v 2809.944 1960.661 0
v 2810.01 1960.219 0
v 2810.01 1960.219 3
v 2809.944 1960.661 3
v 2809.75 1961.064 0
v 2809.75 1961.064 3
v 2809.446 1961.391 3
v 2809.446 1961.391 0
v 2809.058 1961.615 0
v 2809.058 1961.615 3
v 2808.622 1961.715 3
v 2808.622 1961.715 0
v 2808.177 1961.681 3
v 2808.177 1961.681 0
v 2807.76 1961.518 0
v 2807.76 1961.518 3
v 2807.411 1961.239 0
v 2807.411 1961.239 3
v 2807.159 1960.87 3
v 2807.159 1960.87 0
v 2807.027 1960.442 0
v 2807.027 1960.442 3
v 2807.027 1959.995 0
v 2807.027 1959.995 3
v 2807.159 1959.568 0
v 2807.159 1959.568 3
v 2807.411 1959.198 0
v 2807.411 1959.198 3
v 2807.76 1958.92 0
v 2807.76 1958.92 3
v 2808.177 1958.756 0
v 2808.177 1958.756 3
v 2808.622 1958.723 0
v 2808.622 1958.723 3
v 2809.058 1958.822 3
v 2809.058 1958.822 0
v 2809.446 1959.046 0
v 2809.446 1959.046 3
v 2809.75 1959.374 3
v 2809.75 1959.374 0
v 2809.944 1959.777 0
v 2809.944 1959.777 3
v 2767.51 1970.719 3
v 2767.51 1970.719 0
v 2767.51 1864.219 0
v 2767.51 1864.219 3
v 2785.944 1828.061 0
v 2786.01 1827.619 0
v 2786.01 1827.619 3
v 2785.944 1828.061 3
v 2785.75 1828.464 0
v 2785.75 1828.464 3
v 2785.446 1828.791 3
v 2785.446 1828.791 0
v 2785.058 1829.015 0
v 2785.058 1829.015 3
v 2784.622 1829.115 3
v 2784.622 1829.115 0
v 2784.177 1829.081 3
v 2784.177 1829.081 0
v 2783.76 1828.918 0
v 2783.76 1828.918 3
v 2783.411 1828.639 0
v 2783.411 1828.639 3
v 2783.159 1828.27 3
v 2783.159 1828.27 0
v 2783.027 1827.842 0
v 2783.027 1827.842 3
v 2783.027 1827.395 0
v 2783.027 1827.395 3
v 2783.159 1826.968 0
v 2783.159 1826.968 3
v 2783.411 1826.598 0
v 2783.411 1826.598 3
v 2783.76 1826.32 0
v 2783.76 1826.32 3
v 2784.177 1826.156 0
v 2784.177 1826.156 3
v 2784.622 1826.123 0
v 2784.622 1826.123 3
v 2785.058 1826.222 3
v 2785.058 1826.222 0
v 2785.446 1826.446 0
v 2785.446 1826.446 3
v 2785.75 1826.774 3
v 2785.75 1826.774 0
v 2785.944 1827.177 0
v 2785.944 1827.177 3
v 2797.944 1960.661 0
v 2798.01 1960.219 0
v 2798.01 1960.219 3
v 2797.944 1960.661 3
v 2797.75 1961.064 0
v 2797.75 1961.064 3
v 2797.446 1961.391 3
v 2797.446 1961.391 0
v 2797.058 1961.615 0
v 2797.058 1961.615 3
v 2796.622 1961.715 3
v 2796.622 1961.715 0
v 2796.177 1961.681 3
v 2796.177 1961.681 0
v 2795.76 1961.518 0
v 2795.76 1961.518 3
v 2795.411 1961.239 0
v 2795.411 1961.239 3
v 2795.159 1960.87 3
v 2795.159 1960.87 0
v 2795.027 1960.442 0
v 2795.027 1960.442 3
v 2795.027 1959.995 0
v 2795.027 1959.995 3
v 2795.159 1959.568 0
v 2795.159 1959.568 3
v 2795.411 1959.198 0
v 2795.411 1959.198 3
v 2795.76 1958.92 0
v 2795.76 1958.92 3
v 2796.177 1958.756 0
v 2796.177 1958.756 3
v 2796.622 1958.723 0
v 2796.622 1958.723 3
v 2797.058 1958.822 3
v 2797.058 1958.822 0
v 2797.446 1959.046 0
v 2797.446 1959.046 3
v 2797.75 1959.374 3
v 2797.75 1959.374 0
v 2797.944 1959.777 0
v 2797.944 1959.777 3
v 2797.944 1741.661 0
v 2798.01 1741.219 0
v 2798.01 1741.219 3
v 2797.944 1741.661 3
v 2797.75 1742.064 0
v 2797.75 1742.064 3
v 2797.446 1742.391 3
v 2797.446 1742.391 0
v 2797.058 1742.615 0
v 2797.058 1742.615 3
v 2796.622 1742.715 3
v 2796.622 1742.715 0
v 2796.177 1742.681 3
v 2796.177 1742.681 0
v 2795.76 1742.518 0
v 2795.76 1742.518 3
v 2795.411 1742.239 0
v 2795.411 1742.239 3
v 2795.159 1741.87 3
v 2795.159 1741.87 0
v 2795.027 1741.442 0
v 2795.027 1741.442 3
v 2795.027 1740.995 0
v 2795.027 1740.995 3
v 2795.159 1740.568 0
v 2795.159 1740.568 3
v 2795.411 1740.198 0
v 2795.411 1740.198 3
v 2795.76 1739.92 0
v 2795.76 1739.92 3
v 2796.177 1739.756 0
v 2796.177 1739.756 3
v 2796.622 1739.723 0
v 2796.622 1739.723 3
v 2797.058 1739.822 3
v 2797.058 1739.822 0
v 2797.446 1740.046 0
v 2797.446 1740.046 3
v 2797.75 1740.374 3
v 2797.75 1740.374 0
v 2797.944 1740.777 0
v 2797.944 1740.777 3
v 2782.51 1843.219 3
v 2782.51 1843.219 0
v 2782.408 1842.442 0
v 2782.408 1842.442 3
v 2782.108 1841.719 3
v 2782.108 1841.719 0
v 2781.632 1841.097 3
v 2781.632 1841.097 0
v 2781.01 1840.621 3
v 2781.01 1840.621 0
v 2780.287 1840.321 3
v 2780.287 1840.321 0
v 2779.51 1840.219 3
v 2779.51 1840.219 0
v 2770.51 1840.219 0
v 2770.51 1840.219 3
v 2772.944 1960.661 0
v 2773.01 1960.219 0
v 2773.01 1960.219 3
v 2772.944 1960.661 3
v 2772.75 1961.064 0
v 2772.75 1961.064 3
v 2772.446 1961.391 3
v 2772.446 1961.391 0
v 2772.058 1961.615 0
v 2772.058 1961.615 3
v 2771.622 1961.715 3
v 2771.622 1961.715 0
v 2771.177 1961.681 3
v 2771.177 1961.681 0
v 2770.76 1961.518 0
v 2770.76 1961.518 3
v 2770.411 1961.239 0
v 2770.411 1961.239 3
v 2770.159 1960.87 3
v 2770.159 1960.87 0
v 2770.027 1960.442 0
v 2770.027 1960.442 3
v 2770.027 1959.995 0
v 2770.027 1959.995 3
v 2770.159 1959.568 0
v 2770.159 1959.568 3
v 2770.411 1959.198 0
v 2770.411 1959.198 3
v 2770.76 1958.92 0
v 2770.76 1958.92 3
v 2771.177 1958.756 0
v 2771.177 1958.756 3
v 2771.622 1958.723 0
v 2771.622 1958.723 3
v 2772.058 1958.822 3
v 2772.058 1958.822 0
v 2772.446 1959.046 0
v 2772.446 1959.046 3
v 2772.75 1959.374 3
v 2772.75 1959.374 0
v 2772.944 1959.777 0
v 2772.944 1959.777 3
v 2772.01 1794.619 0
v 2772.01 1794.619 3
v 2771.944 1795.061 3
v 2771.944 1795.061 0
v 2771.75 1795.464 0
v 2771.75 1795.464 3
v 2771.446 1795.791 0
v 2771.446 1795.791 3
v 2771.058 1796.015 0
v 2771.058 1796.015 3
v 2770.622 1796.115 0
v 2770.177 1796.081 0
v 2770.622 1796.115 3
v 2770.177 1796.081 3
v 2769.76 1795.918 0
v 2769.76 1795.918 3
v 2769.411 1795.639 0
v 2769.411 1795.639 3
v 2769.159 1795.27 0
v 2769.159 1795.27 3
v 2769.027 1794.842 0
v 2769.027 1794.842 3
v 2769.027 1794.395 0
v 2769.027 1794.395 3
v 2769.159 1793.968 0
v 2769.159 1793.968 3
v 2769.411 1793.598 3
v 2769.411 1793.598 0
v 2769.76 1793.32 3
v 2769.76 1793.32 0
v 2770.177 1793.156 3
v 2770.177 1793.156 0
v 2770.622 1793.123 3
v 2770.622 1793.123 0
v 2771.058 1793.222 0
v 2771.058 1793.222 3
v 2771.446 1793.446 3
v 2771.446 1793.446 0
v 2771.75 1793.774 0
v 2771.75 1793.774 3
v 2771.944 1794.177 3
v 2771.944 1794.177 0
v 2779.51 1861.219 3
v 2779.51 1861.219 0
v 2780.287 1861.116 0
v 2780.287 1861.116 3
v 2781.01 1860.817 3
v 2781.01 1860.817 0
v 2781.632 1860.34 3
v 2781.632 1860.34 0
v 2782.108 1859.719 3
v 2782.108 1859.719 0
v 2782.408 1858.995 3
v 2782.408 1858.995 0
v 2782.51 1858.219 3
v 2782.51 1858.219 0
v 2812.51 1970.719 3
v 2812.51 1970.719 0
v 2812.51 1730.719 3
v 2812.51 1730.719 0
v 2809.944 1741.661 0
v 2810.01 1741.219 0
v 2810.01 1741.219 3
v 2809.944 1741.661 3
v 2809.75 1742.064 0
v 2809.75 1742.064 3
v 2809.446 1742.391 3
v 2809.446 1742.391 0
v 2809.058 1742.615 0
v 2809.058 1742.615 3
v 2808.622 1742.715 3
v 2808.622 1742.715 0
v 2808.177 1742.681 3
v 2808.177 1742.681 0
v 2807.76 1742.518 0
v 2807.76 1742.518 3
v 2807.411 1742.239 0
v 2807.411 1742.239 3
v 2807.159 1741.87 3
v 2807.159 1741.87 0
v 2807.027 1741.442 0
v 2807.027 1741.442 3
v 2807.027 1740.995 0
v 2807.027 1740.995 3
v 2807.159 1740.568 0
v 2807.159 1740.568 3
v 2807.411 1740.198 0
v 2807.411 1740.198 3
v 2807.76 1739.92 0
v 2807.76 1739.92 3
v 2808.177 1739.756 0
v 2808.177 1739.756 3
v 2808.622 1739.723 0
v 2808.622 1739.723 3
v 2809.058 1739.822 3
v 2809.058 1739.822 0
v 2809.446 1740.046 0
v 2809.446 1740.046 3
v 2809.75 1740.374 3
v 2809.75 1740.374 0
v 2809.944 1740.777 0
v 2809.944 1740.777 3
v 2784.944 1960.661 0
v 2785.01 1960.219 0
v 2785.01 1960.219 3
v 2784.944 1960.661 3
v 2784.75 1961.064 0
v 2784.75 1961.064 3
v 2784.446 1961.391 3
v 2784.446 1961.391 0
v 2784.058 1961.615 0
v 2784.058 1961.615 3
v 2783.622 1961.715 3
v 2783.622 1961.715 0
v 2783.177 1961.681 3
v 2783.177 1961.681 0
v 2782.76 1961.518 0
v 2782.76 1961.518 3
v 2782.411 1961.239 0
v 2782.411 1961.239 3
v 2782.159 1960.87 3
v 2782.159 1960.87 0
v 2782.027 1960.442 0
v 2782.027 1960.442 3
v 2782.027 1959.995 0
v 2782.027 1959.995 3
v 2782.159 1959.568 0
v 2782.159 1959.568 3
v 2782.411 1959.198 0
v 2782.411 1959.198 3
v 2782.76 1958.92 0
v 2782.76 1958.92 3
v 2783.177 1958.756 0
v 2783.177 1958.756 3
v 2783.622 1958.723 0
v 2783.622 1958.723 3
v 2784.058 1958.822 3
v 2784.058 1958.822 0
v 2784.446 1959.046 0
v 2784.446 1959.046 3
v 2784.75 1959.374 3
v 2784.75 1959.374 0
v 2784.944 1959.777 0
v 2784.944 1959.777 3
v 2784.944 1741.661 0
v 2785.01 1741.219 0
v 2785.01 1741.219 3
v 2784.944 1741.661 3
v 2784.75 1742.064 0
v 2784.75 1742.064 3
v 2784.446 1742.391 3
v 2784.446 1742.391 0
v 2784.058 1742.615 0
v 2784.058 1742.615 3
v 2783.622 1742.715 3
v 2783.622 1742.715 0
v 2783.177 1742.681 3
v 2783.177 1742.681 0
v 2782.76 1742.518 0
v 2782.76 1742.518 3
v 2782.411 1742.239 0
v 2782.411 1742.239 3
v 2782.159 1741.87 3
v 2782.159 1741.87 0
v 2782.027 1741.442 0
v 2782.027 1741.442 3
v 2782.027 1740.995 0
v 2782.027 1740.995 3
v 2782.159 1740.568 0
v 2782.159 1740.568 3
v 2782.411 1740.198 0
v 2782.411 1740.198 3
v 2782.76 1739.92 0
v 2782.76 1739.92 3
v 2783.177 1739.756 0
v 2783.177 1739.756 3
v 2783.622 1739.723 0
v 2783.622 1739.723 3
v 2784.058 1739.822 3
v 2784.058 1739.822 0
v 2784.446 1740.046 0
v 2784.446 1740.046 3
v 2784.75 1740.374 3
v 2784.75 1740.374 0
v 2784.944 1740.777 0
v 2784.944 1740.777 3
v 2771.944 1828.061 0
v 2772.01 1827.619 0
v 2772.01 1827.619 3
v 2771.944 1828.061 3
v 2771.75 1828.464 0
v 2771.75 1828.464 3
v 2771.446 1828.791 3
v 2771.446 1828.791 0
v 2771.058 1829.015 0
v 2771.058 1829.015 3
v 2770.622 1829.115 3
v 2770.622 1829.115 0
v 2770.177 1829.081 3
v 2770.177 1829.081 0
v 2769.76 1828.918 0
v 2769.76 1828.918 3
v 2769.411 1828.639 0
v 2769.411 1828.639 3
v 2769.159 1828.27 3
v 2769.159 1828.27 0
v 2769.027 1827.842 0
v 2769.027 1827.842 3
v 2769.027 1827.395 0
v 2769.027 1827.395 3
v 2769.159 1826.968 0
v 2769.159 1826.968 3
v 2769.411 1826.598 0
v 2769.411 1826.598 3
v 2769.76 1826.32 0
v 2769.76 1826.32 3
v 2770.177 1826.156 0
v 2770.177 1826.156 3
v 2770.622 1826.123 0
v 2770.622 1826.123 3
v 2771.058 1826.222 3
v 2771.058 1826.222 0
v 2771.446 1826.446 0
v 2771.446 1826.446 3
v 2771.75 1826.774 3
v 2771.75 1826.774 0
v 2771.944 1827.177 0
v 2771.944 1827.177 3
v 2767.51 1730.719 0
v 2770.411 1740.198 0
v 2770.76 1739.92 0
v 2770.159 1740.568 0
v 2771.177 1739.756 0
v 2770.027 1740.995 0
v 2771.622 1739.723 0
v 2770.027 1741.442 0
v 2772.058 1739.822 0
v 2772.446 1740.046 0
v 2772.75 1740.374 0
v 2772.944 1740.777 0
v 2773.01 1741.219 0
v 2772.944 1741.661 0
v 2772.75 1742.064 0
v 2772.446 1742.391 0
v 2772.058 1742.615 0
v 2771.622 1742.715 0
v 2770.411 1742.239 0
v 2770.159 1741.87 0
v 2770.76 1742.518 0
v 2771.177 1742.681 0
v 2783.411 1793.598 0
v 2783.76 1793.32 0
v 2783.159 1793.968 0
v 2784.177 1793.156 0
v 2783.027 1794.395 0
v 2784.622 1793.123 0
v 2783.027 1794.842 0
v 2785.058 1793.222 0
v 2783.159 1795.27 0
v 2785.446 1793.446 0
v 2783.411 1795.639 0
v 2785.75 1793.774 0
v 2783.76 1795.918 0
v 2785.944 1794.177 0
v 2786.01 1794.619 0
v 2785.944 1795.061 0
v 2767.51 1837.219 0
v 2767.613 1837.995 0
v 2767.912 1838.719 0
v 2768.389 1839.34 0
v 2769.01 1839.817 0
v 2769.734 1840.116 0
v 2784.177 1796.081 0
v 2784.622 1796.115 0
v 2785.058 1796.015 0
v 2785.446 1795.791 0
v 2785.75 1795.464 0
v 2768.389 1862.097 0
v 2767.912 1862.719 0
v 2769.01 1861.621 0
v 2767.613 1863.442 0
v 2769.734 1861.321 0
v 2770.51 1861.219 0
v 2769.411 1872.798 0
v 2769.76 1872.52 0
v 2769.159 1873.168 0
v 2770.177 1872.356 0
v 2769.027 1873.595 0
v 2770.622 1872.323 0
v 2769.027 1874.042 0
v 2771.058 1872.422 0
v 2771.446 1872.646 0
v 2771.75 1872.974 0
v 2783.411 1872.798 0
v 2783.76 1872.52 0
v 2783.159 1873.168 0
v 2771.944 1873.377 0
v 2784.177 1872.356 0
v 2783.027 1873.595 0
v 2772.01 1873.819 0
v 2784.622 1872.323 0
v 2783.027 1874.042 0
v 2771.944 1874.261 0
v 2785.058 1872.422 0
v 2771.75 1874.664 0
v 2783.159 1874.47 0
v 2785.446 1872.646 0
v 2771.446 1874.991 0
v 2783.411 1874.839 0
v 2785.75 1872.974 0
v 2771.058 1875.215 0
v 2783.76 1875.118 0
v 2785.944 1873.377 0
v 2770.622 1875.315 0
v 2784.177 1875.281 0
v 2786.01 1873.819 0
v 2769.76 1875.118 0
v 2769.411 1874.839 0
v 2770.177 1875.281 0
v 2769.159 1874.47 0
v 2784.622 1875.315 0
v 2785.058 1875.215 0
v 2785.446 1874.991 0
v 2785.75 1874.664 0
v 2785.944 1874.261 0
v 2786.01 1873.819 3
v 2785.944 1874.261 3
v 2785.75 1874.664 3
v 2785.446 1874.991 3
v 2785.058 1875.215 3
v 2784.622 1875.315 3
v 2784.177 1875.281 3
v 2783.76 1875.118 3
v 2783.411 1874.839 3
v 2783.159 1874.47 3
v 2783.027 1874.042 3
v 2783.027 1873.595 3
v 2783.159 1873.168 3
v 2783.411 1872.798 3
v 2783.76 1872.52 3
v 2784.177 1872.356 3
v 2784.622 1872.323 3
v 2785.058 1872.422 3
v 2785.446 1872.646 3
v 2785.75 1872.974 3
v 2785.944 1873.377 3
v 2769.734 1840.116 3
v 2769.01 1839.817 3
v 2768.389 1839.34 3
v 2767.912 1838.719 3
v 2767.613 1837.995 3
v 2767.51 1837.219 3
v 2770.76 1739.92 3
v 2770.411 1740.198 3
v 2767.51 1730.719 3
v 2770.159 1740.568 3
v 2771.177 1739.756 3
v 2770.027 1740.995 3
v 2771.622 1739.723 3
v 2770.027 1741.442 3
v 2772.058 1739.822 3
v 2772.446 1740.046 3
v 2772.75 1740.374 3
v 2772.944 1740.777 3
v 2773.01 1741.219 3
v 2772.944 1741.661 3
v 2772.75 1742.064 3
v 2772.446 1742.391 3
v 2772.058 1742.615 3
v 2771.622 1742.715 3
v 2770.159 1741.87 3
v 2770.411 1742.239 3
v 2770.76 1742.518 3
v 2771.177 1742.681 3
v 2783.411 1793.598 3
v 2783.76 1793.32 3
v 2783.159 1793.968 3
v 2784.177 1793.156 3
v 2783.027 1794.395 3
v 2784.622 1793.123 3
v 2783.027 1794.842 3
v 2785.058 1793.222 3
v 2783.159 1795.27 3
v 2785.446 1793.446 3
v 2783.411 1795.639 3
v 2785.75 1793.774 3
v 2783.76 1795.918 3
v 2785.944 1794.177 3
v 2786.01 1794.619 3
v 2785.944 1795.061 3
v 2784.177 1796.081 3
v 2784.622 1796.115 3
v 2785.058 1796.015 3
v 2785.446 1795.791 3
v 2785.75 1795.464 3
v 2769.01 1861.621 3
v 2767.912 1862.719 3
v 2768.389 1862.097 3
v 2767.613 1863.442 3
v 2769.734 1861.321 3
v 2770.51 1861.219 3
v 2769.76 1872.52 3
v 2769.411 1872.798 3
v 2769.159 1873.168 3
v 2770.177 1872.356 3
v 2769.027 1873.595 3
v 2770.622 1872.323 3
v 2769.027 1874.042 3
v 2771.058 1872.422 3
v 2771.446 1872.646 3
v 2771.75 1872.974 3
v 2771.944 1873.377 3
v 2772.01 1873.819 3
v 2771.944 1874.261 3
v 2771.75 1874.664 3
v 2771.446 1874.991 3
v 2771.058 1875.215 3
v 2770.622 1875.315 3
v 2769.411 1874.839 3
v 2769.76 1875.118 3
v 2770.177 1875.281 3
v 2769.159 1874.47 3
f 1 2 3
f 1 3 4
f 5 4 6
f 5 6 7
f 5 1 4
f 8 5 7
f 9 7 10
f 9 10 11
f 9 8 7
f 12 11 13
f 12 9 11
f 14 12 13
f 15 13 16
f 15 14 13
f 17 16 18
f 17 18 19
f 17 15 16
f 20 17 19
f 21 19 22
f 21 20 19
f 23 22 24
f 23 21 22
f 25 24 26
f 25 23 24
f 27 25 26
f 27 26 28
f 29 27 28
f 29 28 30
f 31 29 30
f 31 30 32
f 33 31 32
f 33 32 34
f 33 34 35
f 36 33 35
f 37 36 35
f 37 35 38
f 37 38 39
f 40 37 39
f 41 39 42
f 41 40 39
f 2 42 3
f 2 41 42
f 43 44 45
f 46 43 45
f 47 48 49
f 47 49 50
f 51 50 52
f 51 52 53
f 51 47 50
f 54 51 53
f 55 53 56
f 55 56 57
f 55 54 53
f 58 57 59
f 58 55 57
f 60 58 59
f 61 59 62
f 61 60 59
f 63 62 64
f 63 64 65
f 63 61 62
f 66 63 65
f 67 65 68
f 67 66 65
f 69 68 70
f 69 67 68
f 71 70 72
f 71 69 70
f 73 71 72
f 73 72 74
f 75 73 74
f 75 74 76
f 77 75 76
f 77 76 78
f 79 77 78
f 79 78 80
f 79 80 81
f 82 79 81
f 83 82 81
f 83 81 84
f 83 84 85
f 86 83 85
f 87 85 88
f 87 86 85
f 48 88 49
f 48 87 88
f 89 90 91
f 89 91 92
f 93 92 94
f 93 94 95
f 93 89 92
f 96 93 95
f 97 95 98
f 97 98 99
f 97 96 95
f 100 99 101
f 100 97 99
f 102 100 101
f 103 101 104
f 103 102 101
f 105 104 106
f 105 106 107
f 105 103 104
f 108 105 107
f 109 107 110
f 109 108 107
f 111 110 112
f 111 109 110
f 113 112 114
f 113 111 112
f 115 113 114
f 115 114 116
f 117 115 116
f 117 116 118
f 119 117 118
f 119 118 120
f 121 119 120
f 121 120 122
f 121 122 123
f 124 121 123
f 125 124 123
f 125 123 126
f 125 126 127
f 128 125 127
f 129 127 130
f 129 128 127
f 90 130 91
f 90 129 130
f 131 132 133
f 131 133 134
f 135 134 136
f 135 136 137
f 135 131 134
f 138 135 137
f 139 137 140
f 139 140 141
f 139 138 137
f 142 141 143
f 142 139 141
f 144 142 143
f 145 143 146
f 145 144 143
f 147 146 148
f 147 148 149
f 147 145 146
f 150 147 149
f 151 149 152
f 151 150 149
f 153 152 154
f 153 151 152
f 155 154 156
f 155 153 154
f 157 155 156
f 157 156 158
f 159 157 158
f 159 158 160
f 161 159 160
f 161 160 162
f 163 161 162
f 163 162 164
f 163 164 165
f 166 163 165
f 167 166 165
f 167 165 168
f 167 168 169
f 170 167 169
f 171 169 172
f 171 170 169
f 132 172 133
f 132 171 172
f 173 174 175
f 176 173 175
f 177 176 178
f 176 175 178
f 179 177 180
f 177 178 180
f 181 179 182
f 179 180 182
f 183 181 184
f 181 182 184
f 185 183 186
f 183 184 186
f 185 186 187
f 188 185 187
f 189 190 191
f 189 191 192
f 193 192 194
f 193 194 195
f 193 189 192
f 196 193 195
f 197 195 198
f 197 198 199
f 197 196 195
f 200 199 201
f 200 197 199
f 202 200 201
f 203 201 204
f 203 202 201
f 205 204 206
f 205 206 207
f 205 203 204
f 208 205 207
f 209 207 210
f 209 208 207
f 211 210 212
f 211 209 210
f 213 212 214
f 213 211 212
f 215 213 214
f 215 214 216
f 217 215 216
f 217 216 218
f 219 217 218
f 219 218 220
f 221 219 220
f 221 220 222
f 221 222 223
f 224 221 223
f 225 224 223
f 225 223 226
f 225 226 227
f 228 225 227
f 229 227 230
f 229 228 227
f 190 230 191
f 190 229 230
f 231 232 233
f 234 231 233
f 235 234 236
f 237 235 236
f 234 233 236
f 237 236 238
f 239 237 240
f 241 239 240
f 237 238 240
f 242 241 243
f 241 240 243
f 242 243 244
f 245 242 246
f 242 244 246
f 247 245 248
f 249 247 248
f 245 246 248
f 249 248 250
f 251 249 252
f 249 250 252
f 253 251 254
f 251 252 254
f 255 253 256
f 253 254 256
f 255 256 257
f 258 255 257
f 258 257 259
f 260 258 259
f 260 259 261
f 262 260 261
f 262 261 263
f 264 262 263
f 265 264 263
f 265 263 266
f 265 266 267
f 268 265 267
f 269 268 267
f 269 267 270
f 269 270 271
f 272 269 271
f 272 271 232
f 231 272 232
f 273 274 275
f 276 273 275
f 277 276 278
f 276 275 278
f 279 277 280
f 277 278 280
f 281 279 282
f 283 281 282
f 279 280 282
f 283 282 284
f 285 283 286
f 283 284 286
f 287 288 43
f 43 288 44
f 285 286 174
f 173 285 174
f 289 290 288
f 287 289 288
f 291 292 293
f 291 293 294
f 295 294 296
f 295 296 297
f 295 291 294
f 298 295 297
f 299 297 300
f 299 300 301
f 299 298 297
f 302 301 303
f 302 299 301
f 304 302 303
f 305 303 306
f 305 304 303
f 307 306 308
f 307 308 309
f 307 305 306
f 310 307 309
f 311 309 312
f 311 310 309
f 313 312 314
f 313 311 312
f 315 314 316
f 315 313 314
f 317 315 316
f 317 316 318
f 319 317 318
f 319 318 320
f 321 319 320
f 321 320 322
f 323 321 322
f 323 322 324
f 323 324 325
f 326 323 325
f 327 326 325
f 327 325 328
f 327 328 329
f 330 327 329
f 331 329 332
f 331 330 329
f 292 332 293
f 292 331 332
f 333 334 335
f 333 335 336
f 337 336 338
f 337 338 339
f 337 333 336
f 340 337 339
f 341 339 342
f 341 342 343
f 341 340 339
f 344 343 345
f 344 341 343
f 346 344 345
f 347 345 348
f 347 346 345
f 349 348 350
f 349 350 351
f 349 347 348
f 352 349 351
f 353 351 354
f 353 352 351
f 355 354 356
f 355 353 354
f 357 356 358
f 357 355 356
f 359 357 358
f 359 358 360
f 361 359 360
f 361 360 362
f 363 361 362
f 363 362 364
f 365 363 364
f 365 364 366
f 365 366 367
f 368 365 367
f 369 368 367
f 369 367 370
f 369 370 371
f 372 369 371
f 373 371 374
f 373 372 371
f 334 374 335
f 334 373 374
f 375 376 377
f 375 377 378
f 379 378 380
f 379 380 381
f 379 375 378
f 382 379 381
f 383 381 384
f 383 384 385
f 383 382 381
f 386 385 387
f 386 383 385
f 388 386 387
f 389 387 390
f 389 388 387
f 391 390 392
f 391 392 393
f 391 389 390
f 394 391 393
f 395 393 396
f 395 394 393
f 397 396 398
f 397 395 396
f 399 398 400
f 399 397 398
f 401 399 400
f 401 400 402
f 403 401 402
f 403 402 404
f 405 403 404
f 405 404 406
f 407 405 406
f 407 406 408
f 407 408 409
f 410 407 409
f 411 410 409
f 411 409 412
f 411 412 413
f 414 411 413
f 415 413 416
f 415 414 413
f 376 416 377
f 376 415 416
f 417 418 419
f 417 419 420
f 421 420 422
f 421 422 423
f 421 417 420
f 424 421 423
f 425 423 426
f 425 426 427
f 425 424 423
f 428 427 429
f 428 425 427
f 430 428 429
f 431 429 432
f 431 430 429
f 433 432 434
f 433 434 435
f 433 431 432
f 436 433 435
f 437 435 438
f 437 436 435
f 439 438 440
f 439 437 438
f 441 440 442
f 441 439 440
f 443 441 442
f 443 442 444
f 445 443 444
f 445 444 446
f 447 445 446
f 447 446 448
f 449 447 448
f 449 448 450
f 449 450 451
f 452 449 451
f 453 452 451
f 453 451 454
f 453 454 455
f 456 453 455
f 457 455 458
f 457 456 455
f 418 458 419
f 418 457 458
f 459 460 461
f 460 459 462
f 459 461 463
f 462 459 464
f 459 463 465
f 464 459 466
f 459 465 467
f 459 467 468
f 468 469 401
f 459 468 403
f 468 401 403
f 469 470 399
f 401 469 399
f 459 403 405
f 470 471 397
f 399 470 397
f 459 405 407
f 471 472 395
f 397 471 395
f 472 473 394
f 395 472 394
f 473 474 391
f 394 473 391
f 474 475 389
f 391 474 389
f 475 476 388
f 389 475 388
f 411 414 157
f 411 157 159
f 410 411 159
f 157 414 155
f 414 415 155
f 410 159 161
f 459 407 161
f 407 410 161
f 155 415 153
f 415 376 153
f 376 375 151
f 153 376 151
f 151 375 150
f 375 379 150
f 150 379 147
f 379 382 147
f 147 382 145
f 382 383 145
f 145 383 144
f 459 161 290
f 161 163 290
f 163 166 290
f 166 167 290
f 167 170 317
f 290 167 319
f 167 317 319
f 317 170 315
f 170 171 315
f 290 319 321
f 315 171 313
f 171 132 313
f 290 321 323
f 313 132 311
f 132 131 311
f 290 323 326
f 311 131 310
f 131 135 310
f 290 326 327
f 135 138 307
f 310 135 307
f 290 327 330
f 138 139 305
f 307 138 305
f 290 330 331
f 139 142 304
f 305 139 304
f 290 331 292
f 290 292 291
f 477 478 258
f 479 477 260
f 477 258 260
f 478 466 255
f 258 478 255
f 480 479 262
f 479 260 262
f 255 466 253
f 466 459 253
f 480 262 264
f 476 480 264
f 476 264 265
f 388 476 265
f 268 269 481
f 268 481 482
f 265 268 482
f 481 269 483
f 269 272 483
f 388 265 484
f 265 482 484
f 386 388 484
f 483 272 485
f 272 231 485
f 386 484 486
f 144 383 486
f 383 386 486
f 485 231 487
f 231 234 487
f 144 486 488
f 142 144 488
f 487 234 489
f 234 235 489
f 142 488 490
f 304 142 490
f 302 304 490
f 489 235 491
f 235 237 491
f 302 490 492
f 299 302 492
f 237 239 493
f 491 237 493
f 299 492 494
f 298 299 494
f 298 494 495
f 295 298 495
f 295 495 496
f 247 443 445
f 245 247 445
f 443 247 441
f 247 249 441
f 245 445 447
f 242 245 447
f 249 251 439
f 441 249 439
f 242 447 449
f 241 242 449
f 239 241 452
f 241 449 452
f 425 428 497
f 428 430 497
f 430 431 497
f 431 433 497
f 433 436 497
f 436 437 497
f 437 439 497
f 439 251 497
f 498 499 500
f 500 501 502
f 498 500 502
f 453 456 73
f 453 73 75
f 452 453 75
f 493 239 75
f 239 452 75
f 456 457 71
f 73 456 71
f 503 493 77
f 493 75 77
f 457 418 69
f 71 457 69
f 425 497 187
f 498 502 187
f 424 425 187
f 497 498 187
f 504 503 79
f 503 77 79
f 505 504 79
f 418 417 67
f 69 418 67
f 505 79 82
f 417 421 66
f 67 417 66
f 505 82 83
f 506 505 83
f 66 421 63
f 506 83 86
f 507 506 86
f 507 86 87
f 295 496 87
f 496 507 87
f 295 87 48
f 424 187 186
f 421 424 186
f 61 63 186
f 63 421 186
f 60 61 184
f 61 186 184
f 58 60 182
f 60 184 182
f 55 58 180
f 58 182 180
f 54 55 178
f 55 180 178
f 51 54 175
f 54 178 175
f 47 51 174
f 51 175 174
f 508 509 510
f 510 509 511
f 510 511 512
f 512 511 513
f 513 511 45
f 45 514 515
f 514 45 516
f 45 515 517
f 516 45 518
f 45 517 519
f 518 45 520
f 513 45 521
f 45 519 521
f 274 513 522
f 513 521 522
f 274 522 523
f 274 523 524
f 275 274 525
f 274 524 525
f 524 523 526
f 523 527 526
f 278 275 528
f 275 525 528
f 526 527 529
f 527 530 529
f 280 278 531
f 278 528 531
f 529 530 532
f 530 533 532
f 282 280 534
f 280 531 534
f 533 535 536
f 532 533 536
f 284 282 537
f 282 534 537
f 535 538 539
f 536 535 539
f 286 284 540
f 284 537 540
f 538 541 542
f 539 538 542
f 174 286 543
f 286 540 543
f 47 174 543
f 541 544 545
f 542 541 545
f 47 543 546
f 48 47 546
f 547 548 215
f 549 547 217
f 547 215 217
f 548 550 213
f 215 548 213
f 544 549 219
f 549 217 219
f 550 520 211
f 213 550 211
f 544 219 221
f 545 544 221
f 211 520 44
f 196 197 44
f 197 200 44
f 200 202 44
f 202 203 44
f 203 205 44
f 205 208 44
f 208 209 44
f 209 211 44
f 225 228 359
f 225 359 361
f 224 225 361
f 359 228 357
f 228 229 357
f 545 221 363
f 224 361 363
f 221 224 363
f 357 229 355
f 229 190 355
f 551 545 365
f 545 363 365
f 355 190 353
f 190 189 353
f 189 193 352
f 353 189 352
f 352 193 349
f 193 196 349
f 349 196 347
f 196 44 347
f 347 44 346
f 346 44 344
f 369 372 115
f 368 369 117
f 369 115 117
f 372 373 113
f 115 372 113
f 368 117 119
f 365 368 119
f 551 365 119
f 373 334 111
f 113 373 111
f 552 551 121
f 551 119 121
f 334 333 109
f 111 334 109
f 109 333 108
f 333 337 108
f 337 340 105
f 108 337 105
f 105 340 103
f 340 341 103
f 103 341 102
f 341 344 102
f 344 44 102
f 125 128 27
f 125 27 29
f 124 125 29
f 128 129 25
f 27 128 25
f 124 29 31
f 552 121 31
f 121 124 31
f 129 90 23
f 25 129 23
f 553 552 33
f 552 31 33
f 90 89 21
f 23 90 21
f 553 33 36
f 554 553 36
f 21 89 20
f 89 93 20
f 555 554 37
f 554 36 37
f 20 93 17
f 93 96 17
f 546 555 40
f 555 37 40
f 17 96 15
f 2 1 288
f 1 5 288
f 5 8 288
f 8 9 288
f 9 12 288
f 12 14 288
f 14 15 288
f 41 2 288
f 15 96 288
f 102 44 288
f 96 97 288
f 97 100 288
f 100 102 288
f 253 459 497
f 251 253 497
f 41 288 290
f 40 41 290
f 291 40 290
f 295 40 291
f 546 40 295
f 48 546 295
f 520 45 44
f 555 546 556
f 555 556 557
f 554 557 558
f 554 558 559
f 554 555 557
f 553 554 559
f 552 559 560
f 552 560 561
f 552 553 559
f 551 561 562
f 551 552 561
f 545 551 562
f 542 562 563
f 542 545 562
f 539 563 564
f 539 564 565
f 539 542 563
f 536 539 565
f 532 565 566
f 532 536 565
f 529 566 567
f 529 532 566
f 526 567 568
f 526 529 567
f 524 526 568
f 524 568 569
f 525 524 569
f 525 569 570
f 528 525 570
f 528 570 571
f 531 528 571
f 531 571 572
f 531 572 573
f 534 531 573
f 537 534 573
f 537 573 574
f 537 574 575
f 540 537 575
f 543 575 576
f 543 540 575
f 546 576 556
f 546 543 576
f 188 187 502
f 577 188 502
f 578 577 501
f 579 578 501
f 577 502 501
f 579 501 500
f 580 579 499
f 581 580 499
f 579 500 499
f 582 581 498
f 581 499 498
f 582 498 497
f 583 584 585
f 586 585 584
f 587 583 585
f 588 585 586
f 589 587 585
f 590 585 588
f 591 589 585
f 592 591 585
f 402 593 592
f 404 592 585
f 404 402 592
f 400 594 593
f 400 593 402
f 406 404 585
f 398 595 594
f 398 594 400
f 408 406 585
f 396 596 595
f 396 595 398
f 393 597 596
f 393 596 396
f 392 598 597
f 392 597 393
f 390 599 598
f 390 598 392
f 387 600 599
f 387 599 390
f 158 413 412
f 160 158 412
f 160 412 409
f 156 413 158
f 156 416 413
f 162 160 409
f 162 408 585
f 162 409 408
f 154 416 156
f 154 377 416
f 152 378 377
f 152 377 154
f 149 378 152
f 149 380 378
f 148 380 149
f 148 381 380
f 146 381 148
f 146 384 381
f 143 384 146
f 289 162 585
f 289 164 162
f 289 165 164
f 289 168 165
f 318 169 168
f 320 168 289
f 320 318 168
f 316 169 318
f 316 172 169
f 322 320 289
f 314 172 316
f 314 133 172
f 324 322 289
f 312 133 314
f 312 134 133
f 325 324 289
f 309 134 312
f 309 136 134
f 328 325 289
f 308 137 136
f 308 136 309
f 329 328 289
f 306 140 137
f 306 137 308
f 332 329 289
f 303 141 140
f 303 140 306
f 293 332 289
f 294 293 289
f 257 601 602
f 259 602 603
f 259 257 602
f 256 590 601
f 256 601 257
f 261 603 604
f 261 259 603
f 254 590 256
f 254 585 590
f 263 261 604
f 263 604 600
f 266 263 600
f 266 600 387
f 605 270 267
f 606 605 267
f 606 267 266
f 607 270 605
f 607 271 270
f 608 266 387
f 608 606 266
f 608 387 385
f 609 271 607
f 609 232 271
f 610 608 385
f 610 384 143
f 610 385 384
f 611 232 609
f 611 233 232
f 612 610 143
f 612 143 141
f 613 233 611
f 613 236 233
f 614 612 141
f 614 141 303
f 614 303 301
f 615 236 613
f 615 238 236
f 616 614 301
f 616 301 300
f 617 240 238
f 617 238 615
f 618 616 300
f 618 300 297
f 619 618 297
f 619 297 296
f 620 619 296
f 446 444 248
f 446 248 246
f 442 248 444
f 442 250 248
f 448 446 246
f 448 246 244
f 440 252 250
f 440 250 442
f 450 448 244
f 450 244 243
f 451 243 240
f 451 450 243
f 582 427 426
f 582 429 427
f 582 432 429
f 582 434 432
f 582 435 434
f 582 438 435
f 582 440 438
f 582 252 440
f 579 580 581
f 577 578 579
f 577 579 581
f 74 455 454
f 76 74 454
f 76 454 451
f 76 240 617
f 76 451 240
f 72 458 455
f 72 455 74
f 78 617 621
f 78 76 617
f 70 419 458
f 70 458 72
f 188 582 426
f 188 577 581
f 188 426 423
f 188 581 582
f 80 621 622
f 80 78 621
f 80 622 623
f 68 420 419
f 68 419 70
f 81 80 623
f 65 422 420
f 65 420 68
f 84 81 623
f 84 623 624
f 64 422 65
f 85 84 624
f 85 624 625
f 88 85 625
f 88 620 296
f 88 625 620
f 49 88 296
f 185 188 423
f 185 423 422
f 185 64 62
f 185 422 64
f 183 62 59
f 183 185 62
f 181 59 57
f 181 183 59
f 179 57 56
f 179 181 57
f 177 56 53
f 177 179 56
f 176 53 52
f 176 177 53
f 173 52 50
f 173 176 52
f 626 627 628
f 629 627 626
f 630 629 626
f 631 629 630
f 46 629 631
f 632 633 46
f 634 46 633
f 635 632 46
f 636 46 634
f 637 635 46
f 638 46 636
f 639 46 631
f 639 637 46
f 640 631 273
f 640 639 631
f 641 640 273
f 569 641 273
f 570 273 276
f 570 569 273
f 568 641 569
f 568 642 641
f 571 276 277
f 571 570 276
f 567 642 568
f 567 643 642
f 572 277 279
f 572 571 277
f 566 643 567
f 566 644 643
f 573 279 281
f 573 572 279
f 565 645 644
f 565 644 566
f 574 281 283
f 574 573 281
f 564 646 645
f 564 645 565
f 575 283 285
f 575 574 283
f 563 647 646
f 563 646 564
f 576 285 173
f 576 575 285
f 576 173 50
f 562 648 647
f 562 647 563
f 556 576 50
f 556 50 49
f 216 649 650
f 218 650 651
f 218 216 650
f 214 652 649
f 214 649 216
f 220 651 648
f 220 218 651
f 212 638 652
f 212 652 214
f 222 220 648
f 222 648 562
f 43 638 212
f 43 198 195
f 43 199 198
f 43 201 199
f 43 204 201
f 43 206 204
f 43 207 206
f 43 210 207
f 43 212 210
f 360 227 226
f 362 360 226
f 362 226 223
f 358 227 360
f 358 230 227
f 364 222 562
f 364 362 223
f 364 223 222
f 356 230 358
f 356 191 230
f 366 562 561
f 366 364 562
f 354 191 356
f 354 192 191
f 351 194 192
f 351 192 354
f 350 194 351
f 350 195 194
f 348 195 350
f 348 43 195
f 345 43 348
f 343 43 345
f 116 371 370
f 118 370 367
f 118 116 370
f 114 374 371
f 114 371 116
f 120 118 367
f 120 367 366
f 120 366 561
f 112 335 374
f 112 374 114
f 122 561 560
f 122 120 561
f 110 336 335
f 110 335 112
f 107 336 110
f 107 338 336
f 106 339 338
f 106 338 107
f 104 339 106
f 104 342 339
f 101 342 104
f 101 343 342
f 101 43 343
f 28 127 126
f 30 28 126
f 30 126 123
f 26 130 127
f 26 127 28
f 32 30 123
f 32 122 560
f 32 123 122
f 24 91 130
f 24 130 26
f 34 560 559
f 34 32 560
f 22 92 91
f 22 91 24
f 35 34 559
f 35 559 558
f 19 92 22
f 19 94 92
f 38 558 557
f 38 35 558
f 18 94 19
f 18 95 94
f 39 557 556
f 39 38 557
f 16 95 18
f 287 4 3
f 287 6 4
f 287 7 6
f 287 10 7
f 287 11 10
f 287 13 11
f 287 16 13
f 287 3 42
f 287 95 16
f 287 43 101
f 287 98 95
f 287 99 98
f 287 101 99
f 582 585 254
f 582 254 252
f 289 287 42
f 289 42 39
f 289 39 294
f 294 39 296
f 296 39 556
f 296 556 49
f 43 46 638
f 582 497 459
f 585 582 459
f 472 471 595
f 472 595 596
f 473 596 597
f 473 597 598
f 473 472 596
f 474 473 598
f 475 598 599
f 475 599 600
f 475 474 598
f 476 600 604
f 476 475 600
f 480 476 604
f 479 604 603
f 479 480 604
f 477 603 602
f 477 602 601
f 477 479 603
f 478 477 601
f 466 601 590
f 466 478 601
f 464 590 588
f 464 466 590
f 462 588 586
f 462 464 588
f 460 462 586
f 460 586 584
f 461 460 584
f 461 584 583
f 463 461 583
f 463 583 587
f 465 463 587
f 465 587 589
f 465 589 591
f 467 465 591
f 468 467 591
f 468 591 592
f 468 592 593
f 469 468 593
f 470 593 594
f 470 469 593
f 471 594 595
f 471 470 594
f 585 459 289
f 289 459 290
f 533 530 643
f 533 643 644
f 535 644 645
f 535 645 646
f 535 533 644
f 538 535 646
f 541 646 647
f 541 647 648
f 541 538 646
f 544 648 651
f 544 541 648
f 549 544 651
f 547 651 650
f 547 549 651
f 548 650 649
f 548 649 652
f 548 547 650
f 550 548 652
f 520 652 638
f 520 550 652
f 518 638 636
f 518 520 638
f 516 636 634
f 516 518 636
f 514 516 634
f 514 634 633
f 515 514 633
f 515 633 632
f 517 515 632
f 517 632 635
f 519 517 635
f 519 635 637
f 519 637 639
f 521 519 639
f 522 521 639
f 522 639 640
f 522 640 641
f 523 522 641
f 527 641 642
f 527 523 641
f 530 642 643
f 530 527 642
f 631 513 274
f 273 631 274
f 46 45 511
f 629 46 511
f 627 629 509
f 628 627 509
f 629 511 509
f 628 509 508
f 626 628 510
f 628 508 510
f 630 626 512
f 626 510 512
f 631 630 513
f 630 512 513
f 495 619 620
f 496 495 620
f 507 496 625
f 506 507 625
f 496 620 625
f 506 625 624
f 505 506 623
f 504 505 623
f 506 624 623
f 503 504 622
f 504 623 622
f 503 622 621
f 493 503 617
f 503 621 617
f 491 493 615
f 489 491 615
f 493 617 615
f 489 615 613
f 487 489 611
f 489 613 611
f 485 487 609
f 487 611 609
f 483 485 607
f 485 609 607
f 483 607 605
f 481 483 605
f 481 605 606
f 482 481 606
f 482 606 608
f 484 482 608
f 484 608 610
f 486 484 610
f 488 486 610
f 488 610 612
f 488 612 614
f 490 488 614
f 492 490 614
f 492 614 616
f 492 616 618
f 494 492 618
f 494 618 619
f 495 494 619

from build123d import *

# Parameters (mm, degrees)
MODEL_R             = 1.5
EXTRUDE_1_DEPTH     = 3
SKETCH_1_R          = 1.5
CUT_EXTRUDE_1_DEPTH = 10


with BuildPart() as part:
    # Model → 凸台-拉伸1 (new body)
    with BuildSketch(Plane.XY):
        with BuildLine():
            ThreePointArc((2779.510343176, 1861.218710153), (2781.63166352, 1860.340030496), (2782.510343176, 1858.218710153))
            Line((2782.510343176, 1858.218710153), (2782.510343176, 1843.218710153))
            ThreePointArc((2782.510343176, 1843.218710153), (2781.63166352, 1841.097389809), (2779.510343176, 1840.218710153))
            Line((2779.510343176, 1840.218710153), (2770.510343176, 1840.218710153))
            ThreePointArc((2770.510343176, 1840.218710153), (2768.389022832, 1839.340030496), (2767.510343176, 1837.218710153))
            Line((2767.510343176, 1837.218710153), (2767.510343176, 1744.718710153))
            Line((2767.510343176, 1744.718710153), (2767.510343176, 1730.718710153))
            Line((2767.510343176, 1730.718710153), (2787.510343176, 1730.718710153))
            Line((2787.510343176, 1730.718710153), (2792.510343176, 1730.718710153))
            Line((2792.510343176, 1730.718710153), (2812.510343176, 1730.718710153))
            Line((2812.510343176, 1730.718710153), (2812.510343176, 1732.218710153))
            Line((2812.510343176, 1732.218710153), (2812.510343176, 1737.218710153))
            Line((2812.510343176, 1737.218710153), (2812.510343176, 1744.718710153))
            Line((2812.510343176, 1744.718710153), (2812.510343176, 1970.718710153))
            Line((2812.510343176, 1970.718710153), (2767.510343176, 1970.718710153))
            Line((2767.510343176, 1970.718710153), (2767.510343176, 1864.218710153))
            ThreePointArc((2767.510343176, 1864.218710153), (2768.389022832, 1862.097389809), (2770.510343176, 1861.218710153))
            Line((2770.510343176, 1861.218710153), (2779.510343176, 1861.218710153))
        make_face()
        with Locations((2771.510343176, 1741.218710153)):
            Circle(MODEL_R, mode=Mode.SUBTRACT)
        with Locations((2783.510343176, 1741.218710153)):
            Circle(MODEL_R, mode=Mode.SUBTRACT)
        with Locations((2770.510343176, 1827.618710153)):
            Circle(MODEL_R, mode=Mode.SUBTRACT)
        with Locations((2784.510343176, 1827.618710153)):
            Circle(MODEL_R, mode=Mode.SUBTRACT)
        with Locations((2796.510343176, 1741.218710153)):
            Circle(MODEL_R, mode=Mode.SUBTRACT)
        with Locations((2808.510343176, 1741.218710153)):
            Circle(MODEL_R, mode=Mode.SUBTRACT)
        with Locations((2770.510343176, 1873.818710153)):
            Circle(MODEL_R, mode=Mode.SUBTRACT)
        with Locations((2784.510343176, 1873.818710153)):
            Circle(MODEL_R, mode=Mode.SUBTRACT)
        with Locations((2771.510343176, 1960.218710153)):
            Circle(MODEL_R, mode=Mode.SUBTRACT)
        with Locations((2783.510343176, 1960.218710153)):
            Circle(MODEL_R, mode=Mode.SUBTRACT)
        with Locations((2796.510343176, 1960.218710153)):
            Circle(MODEL_R, mode=Mode.SUBTRACT)
        with Locations((2808.510343176, 1960.218710153)):
            Circle(MODEL_R, mode=Mode.SUBTRACT)
    extrude(amount=EXTRUDE_1_DEPTH)

    # 草图1 → 切除-拉伸1 (cut)
    with BuildSketch(Plane.XY.offset(3)):
        with Locations((2770.510343176, 1794.618710153)):
            Circle(SKETCH_1_R)
        with Locations((2784.510343176, 1794.618710153)):
            Circle(SKETCH_1_R)
    extrude(amount=-CUT_EXTRUDE_1_DEPTH, mode=Mode.SUBTRACT)


solid = part.part
